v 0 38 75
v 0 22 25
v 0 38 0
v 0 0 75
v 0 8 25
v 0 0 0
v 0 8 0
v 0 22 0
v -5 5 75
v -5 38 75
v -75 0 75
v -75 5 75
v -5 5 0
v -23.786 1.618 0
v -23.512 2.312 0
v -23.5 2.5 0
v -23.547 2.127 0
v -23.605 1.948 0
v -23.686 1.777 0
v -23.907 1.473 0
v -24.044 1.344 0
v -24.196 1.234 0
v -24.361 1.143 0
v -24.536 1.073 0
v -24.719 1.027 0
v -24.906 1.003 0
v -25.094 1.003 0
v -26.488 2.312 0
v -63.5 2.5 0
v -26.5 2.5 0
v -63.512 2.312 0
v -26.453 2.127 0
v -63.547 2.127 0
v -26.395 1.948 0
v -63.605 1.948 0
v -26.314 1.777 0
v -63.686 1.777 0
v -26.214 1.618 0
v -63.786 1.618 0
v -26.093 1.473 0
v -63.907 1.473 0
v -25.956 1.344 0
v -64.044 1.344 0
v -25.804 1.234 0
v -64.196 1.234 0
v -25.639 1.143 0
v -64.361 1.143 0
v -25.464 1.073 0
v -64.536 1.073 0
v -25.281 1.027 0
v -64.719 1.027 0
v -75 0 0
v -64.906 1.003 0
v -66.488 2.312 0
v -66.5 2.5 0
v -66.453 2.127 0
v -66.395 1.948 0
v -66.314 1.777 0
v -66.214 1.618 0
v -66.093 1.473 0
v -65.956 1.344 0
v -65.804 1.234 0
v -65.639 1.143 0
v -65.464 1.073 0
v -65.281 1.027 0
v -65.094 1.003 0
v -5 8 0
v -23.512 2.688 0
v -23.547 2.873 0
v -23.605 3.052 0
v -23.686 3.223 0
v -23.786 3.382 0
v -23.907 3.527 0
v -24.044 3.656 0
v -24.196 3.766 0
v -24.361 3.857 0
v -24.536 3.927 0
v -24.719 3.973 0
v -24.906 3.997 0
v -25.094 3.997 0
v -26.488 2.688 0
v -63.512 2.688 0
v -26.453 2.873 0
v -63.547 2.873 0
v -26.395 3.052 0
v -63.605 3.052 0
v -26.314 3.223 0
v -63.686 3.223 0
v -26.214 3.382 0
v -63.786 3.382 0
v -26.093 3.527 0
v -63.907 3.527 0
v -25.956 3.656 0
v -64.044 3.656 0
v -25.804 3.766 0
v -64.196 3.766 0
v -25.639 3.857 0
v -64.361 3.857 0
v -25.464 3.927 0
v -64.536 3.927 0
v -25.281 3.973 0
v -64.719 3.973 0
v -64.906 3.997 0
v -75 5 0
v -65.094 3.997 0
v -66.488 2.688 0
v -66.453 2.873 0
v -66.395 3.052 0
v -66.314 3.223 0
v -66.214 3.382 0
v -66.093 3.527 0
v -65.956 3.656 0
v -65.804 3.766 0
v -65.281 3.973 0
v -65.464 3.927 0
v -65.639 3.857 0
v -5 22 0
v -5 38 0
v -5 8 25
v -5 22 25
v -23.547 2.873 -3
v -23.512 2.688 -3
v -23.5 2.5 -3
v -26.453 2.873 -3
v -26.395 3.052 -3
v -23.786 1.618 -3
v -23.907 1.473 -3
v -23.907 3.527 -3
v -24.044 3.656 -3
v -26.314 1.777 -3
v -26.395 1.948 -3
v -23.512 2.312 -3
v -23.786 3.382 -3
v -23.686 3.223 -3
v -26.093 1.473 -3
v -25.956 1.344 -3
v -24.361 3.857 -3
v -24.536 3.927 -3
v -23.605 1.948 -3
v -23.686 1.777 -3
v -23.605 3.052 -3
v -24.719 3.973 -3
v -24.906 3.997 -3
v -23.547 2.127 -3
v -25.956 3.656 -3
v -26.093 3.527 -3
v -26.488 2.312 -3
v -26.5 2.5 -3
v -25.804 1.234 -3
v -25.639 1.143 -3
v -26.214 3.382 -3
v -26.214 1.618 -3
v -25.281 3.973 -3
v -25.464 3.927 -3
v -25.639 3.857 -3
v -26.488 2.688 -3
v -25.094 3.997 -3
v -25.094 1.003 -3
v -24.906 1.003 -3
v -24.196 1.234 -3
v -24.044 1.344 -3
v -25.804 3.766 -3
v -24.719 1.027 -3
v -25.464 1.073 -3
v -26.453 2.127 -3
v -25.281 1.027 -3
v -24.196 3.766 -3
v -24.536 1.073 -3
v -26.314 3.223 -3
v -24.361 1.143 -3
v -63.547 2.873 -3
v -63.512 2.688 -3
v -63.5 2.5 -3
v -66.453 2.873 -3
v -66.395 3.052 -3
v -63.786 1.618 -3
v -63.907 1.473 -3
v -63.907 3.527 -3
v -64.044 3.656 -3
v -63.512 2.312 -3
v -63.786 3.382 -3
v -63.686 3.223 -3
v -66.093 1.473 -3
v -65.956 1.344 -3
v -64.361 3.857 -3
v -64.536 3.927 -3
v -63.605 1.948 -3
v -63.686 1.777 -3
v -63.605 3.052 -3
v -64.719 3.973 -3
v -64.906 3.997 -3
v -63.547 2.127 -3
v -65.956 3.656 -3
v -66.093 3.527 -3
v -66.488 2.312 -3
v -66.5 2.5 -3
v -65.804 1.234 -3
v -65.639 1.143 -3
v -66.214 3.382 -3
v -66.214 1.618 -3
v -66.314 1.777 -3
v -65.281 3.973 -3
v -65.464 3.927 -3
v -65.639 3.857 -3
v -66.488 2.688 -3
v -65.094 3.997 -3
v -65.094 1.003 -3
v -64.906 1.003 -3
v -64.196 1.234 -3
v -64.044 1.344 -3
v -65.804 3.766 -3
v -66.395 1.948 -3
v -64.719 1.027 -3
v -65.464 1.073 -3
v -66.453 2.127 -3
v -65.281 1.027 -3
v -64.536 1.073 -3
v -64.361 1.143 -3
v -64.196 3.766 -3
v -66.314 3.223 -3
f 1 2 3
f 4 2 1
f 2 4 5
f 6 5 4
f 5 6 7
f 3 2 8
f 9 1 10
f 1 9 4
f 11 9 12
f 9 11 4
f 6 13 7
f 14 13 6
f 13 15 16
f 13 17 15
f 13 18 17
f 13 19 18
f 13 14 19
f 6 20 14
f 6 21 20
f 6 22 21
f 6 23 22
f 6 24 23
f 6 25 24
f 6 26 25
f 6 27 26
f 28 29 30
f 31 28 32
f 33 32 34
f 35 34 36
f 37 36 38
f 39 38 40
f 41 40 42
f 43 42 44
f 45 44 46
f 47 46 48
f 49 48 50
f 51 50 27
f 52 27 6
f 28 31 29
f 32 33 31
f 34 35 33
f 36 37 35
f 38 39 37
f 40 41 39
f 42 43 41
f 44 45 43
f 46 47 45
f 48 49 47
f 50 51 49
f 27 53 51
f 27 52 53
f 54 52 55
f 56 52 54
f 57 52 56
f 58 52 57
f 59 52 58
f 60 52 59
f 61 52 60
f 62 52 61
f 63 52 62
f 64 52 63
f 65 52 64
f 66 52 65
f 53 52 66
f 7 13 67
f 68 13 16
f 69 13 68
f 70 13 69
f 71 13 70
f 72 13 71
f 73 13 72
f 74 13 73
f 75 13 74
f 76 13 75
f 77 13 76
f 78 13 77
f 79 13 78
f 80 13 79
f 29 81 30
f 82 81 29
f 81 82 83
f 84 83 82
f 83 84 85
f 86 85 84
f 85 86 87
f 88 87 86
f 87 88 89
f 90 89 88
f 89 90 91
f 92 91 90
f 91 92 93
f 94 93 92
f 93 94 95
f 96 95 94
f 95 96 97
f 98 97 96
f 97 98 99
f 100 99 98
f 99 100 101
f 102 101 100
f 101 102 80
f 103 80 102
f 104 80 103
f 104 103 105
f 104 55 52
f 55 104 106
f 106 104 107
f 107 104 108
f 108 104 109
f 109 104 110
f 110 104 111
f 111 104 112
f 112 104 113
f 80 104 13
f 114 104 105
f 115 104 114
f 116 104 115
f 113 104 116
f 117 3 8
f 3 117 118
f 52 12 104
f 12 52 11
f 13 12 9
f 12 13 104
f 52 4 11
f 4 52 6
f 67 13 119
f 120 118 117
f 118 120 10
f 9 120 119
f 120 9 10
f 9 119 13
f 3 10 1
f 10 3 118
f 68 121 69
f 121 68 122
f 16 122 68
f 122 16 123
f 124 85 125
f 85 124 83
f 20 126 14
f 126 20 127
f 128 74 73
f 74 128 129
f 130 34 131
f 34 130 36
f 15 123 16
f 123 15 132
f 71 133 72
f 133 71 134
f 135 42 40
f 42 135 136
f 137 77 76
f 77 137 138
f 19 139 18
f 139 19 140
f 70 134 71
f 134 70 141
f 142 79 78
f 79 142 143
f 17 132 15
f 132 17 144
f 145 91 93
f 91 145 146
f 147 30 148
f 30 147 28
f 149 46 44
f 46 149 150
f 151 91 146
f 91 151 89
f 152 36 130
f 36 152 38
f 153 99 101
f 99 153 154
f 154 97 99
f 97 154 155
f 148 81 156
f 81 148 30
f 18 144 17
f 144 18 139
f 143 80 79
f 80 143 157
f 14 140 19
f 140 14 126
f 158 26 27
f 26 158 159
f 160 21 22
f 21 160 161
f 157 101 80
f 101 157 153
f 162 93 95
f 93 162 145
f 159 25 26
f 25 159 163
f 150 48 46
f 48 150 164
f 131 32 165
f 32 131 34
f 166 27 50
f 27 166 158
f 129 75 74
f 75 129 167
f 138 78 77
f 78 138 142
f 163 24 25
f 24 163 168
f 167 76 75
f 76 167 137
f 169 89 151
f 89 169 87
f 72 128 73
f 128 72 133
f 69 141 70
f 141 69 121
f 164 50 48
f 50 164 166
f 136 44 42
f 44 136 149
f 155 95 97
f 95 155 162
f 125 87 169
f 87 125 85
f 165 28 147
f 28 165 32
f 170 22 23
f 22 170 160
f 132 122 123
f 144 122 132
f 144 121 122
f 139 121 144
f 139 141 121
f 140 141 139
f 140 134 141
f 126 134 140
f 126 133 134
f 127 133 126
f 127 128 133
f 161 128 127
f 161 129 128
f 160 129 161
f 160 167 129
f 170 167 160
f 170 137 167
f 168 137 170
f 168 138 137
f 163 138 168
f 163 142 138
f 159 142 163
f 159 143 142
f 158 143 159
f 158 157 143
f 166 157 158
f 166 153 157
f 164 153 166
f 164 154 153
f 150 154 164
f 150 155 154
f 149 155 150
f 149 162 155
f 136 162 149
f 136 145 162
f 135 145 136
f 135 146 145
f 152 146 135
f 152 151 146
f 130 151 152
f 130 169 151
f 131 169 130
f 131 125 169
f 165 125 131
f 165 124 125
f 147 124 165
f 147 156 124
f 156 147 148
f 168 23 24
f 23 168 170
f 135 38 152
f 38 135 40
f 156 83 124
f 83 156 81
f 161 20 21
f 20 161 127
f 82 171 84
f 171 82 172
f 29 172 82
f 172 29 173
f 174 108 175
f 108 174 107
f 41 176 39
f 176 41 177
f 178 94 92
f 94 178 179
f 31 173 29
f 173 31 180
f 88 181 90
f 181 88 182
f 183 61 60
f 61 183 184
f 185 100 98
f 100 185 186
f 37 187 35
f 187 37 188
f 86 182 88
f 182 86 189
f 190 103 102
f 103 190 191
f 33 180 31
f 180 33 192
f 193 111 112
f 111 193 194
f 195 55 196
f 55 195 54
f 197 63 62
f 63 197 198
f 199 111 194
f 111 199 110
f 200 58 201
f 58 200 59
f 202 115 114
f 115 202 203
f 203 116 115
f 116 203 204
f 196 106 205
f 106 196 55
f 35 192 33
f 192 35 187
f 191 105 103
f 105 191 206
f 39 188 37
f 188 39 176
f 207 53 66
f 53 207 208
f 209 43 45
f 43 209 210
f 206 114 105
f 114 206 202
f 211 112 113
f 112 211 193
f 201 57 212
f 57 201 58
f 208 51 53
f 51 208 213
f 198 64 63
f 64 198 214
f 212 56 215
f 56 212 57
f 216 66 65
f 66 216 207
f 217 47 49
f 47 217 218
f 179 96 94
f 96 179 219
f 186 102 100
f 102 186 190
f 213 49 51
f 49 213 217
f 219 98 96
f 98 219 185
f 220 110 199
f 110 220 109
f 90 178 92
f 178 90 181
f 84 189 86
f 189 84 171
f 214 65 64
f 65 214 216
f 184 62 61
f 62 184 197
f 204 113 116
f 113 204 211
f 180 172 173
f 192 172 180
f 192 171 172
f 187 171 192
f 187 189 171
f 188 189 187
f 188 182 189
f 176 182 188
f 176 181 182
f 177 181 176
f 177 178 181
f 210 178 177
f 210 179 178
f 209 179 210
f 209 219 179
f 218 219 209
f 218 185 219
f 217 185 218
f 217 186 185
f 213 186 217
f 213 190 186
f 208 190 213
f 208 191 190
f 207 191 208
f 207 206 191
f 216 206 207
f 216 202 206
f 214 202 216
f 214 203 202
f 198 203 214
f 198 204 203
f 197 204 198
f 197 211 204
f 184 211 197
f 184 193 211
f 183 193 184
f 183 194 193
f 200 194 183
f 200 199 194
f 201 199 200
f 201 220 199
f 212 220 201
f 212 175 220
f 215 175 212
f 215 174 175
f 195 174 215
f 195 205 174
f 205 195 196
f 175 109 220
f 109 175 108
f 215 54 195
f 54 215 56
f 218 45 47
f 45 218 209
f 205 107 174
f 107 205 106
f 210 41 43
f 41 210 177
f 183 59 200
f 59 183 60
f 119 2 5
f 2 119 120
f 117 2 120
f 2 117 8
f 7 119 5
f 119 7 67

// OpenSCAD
//Spessore parete del corridoio, con la porta
spessore_uno=5; 
//lunghezza della prima parete
lunghezza_uno=38; 

//spessore parete divisoria degli ambienti
spessore_due=5;
lunghezza_due = 75; 
//
//altezza uguale per tutte le pareti
altezza=75; 


//dati relativi alla porta
altezza_porta = 25; 
larghezza_porta = 14;
//distanza della porta a partire dall'angolo esterno
distanza_porta = 8;

//parametri relativi alle finestre, ma non ancora inseriti nel modello
lunghezza_fin=15;
 altezza_fin=11;

due_pareti_porta();




//con questa funzione si creano due pareti ad angolo retto
module due_pareti(){
   union(){
   translate([-lunghezza_due,0,0]){ cube([lunghezza_due, spessore_due, altezza]);
   }
   rotate([0,0,90])    cube([lunghezza_uno, spessore_uno, altezza]);
    translate([-lunghezza_due/3,spessore_due/2,-3])cylinder(10, 1.5,1.5, $fn=50);
    translate([-lunghezza_due+10,spessore_due/2,-3])cylinder(10, 1.5,1.5, $fn=50);
   }
}


module due_pareti_porta(){
    
    difference(){
        due_pareti();
        translate([-spessore_due,distanza_porta,0]) cube([spessore_due,larghezza_porta,altezza_porta]);
    }
}

module finestra(){
    
    cube([lunghezza_fin, spessore, altezza_fin]);
    
    }
    
    
    
